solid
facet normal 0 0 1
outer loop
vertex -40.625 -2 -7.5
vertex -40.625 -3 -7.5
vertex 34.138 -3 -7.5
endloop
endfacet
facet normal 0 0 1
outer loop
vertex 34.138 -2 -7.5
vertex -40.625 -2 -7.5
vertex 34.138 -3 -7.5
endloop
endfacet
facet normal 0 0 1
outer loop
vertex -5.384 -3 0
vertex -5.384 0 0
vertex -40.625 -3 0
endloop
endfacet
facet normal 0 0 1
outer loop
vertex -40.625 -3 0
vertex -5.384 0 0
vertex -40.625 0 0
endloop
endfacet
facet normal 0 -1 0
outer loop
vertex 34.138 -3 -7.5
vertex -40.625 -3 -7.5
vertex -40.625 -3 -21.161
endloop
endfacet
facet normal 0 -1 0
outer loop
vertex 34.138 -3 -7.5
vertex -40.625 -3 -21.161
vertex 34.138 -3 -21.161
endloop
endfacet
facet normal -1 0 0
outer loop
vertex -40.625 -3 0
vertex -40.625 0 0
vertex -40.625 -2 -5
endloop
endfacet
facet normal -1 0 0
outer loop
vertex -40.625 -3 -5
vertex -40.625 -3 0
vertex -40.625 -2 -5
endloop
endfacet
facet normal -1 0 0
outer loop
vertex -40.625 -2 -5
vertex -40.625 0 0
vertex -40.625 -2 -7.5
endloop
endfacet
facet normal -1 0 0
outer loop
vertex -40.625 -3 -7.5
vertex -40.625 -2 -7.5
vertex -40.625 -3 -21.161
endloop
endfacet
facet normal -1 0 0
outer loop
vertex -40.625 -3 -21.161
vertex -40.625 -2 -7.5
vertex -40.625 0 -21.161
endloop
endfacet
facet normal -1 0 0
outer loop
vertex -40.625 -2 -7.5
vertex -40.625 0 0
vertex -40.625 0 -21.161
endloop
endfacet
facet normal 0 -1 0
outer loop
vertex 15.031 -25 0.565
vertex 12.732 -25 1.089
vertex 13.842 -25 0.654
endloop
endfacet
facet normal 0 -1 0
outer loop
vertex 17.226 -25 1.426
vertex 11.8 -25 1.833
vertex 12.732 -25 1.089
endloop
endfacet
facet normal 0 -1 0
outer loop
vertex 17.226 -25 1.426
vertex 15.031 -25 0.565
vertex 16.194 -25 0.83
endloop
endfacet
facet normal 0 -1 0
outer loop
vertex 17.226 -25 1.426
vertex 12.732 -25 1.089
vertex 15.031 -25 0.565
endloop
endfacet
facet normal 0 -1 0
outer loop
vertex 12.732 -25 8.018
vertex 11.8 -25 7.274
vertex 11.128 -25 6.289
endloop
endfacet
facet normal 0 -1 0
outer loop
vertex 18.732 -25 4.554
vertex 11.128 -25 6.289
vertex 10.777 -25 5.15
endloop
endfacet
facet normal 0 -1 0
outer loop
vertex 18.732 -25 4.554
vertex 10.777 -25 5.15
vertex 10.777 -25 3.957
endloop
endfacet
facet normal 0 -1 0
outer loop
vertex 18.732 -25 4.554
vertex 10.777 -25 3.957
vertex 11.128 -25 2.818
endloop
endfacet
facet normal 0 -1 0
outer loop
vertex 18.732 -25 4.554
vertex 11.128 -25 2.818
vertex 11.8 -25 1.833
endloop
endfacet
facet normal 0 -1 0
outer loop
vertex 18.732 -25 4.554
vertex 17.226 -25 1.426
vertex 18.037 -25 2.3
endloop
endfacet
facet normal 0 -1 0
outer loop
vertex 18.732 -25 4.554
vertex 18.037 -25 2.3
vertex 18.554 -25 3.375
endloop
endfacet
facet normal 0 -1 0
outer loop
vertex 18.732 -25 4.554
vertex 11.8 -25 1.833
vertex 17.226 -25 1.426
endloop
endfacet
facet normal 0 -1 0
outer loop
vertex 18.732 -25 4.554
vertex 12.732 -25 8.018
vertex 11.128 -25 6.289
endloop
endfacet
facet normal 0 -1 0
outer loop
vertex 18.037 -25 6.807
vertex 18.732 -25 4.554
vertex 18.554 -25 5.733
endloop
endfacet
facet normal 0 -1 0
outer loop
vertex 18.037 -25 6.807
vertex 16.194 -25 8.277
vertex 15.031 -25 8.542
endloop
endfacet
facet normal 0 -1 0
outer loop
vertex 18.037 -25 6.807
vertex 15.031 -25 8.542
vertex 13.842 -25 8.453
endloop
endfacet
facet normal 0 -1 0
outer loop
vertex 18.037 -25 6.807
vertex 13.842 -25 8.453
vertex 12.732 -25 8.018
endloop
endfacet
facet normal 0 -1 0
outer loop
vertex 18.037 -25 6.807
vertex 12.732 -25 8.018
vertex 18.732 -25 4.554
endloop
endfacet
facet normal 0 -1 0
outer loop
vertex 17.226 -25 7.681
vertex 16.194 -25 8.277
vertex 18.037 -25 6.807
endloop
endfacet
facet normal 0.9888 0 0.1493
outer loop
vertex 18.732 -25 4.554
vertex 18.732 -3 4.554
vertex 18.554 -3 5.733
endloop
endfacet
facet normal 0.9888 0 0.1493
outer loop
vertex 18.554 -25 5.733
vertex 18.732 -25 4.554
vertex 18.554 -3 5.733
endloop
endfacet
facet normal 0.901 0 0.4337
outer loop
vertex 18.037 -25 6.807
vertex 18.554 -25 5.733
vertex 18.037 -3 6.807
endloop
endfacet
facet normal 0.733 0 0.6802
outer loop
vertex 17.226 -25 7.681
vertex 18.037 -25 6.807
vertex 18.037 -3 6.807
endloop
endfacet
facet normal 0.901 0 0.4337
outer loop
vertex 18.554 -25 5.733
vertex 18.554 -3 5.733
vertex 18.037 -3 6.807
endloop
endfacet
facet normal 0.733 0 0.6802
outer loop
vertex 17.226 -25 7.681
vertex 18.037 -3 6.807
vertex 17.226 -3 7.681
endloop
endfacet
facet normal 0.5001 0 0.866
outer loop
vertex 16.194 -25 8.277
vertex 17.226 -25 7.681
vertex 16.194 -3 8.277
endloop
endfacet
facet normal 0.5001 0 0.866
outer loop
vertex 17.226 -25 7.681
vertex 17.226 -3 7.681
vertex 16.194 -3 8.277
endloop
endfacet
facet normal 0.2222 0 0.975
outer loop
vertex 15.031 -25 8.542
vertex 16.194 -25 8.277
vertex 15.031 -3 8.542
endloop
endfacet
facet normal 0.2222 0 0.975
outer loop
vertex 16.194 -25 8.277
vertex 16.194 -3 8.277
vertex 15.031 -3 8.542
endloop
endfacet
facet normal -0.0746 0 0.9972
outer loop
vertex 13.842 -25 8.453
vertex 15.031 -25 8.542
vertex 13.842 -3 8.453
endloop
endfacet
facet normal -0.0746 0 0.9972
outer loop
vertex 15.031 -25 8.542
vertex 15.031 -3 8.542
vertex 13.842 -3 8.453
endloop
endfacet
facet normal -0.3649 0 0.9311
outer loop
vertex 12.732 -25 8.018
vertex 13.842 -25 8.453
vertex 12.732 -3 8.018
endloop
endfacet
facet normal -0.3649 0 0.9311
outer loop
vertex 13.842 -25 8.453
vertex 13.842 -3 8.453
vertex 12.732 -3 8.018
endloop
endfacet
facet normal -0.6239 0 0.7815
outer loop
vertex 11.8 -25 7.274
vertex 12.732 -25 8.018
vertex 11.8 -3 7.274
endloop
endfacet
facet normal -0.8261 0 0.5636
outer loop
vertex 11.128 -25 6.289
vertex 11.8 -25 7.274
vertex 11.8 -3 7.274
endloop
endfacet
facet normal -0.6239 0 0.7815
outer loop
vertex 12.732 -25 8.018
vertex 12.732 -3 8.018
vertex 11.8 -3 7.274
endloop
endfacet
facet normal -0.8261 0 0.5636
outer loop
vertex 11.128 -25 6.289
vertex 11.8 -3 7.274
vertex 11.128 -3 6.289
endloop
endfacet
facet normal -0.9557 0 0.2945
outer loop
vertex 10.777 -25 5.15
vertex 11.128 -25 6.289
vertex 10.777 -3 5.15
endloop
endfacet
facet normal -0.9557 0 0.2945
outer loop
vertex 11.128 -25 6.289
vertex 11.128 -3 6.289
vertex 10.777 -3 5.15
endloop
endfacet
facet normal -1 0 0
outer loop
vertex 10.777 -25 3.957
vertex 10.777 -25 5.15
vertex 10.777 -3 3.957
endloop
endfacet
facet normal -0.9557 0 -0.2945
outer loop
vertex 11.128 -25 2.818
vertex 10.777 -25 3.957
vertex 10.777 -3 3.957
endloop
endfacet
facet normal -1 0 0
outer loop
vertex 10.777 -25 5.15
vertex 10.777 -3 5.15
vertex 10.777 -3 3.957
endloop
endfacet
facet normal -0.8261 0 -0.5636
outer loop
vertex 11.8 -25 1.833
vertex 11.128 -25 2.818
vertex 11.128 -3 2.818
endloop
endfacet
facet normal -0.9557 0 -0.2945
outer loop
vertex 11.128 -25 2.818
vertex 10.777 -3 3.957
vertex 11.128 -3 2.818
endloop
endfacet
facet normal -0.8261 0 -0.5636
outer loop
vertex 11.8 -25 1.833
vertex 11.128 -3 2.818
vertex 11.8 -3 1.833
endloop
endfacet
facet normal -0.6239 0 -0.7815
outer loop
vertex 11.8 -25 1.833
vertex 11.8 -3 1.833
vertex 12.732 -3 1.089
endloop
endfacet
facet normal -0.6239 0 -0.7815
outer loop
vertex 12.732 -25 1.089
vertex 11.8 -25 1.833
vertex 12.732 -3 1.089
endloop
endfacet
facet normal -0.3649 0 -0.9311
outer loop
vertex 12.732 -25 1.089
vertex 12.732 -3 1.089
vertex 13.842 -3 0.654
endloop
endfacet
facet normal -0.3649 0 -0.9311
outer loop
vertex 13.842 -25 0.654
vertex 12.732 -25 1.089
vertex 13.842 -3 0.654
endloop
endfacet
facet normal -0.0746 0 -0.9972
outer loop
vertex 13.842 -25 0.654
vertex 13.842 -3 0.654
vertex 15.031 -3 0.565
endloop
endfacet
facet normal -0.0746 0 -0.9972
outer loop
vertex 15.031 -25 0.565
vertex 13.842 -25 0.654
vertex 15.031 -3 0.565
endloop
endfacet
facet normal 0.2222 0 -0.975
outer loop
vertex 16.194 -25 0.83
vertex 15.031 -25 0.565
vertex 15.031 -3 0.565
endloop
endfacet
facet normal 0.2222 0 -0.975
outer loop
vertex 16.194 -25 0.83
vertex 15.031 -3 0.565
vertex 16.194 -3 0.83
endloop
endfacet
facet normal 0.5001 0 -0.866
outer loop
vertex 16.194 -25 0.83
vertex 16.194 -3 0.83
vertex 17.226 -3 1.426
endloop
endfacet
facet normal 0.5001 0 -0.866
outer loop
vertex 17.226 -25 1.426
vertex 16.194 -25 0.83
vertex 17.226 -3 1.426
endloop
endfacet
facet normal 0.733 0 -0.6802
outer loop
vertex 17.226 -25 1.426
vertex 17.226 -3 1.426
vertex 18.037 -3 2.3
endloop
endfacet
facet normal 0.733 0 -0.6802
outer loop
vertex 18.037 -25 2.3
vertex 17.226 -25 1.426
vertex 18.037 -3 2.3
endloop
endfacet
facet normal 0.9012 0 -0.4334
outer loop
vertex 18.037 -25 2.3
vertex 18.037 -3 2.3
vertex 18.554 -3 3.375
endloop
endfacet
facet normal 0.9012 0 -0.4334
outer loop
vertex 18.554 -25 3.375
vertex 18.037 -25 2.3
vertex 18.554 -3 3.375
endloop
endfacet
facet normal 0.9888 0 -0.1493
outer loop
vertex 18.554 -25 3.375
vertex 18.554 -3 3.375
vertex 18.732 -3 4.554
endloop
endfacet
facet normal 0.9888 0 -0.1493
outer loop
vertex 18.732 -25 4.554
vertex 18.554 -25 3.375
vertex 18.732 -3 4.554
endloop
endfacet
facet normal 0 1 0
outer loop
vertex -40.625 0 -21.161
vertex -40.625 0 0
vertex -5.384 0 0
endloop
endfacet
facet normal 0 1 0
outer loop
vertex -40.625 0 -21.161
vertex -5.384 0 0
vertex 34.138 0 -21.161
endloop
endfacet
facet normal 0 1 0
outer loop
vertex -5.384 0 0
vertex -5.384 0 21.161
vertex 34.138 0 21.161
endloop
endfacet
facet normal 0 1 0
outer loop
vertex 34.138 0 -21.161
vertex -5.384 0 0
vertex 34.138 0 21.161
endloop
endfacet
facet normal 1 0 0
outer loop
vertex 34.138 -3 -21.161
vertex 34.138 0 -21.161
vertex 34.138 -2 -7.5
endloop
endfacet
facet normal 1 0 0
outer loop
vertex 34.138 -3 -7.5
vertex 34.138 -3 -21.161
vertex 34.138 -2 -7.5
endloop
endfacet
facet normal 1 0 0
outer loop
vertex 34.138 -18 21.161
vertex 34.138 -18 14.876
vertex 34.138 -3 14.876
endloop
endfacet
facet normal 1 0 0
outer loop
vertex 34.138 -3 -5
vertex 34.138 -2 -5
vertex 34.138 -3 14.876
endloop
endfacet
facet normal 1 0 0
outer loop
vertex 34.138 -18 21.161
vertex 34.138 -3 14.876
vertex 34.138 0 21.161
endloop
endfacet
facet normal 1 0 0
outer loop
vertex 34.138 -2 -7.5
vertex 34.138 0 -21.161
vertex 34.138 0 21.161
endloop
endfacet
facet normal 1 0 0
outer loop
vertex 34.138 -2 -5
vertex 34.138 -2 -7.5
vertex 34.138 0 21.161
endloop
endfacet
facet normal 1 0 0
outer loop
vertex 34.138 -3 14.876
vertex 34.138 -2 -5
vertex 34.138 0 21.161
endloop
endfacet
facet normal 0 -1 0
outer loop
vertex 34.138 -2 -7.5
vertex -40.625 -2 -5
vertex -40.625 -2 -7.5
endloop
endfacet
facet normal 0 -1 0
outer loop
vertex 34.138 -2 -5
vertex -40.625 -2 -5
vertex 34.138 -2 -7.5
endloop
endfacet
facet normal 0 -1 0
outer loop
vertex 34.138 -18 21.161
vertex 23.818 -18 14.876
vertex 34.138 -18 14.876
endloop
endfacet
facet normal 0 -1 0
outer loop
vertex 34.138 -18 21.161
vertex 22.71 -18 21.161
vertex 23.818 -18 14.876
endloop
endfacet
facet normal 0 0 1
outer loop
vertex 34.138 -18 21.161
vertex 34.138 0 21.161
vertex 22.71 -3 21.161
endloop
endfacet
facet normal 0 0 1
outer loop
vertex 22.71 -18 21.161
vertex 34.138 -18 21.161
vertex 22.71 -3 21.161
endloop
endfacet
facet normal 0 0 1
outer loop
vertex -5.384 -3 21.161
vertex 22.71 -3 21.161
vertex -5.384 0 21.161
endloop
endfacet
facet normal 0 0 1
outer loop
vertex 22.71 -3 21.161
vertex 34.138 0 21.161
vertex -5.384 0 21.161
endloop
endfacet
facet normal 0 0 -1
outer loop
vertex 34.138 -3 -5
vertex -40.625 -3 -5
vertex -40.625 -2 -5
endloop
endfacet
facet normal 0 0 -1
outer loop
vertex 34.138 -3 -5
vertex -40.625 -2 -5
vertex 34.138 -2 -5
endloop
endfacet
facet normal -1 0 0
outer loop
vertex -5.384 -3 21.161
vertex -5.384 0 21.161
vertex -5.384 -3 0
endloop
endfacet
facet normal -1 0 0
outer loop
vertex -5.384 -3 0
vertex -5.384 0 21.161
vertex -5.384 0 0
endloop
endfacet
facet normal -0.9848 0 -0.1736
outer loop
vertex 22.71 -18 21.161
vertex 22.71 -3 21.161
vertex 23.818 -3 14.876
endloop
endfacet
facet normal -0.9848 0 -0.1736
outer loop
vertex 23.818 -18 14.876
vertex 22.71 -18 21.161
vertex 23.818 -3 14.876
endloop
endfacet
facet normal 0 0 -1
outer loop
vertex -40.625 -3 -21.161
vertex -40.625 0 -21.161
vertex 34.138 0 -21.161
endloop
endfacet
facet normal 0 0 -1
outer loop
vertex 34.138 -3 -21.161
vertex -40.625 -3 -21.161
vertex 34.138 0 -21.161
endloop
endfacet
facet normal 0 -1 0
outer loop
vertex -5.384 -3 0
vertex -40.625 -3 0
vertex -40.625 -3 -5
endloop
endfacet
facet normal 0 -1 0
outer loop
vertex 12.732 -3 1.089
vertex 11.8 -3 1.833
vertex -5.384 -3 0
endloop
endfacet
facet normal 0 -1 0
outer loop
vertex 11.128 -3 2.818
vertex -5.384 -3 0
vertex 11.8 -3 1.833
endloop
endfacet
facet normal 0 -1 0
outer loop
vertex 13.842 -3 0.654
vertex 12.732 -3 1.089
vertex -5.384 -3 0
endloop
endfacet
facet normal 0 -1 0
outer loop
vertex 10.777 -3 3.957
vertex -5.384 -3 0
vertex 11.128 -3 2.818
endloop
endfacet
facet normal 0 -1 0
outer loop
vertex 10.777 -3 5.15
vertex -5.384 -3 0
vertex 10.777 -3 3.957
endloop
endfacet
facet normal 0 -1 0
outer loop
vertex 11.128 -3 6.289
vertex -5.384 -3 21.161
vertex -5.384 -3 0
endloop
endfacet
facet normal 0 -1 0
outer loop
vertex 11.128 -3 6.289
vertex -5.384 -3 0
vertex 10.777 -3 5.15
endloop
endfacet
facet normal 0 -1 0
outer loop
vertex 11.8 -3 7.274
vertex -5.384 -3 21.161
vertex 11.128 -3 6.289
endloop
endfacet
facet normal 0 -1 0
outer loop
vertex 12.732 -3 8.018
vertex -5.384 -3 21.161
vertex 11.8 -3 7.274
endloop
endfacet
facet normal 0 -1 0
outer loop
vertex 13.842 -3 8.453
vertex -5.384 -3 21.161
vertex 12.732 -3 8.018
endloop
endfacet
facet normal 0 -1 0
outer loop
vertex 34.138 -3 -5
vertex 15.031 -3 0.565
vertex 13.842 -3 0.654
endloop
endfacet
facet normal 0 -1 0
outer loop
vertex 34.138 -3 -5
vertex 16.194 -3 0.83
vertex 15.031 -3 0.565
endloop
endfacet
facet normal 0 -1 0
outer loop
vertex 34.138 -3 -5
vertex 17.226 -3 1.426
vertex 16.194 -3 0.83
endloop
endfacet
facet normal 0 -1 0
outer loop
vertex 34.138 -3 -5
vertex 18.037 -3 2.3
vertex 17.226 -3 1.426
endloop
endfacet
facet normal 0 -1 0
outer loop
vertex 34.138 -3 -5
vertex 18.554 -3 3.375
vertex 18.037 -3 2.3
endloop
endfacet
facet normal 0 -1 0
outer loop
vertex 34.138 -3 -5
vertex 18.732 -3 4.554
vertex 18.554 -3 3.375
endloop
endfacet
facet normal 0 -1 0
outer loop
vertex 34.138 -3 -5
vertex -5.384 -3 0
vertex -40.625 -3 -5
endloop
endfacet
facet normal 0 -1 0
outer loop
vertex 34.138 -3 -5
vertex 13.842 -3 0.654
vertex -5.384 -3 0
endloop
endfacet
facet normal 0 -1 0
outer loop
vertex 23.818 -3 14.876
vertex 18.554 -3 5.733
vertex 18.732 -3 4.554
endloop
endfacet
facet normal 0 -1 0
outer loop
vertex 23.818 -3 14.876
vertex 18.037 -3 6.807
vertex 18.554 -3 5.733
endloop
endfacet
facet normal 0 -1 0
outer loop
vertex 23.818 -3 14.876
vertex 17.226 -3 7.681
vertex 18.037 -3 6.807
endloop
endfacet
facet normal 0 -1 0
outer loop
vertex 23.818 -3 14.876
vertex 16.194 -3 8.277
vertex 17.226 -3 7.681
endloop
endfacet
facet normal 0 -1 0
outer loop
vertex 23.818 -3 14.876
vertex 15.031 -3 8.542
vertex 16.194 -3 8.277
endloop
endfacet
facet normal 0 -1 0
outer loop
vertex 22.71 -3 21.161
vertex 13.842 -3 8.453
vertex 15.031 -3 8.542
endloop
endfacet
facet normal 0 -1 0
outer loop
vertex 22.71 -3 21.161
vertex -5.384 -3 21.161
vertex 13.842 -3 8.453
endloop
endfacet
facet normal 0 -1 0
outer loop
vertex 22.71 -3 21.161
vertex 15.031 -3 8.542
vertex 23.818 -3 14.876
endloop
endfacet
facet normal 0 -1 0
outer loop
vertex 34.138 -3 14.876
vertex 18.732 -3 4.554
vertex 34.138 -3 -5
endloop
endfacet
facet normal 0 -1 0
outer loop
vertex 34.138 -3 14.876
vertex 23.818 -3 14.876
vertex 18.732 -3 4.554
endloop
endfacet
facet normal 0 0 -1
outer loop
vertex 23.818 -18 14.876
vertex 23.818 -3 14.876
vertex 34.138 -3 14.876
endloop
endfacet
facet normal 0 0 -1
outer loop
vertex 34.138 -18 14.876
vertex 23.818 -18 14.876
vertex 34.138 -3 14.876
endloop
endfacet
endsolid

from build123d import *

# Parameters (mm, degrees)
F0_R     = 4
F1_DEPTH = 3
F2_DEPTH = 25
F3_W     = 74.7634656727
F3_H     = 2.5
F4_DEPTH = 1
F5_DEPTH = 18


with BuildPart() as f1:
    # F0 (on Front) → F1 (new body)
    with BuildSketch(Plane.XZ):
        Polygon((-5.3837564774, 0), (-40.6250022352, 0), (-40.6250022352, -21.1607143283), (34.1384634376, -21.1607143283), (34.1384634376, 14.8761495948), (23.8177376958, 14.8761495948), (22.7095993713, 21.1607143283), (-5.3837564774, 21.1607143283), align=None)
        with Locations((14.7321438417, 4.5535718091)):
            Circle(F0_R, mode=Mode.SUBTRACT)
    extrude(amount=F1_DEPTH)

    # F0 (on Front) → F2 (join)
    with BuildSketch(Plane.XZ):
        with Locations((14.7321438417, 4.5535718091)):
            Circle(F0_R)
    extrude(amount=F2_DEPTH)

    # F3 (on face) → F4 (cut)
    with BuildSketch(Plane.XZ.offset(3)):
        with Locations((-3.2432693988, -6.25)):
            Rectangle(F3_W, F3_H)
    extrude(amount=-F4_DEPTH, mode=Mode.SUBTRACT)

    # F0 (on Front) → F5 (join)
    with BuildSketch(Plane.XZ):
        Polygon((23.8177376958, 14.8761495948), (34.1384634376, 14.8761495948), (34.1384634376, 21.1607143283), (22.7095993713, 21.1607143283), align=None)
    extrude(amount=F5_DEPTH)


solid = f1.part
